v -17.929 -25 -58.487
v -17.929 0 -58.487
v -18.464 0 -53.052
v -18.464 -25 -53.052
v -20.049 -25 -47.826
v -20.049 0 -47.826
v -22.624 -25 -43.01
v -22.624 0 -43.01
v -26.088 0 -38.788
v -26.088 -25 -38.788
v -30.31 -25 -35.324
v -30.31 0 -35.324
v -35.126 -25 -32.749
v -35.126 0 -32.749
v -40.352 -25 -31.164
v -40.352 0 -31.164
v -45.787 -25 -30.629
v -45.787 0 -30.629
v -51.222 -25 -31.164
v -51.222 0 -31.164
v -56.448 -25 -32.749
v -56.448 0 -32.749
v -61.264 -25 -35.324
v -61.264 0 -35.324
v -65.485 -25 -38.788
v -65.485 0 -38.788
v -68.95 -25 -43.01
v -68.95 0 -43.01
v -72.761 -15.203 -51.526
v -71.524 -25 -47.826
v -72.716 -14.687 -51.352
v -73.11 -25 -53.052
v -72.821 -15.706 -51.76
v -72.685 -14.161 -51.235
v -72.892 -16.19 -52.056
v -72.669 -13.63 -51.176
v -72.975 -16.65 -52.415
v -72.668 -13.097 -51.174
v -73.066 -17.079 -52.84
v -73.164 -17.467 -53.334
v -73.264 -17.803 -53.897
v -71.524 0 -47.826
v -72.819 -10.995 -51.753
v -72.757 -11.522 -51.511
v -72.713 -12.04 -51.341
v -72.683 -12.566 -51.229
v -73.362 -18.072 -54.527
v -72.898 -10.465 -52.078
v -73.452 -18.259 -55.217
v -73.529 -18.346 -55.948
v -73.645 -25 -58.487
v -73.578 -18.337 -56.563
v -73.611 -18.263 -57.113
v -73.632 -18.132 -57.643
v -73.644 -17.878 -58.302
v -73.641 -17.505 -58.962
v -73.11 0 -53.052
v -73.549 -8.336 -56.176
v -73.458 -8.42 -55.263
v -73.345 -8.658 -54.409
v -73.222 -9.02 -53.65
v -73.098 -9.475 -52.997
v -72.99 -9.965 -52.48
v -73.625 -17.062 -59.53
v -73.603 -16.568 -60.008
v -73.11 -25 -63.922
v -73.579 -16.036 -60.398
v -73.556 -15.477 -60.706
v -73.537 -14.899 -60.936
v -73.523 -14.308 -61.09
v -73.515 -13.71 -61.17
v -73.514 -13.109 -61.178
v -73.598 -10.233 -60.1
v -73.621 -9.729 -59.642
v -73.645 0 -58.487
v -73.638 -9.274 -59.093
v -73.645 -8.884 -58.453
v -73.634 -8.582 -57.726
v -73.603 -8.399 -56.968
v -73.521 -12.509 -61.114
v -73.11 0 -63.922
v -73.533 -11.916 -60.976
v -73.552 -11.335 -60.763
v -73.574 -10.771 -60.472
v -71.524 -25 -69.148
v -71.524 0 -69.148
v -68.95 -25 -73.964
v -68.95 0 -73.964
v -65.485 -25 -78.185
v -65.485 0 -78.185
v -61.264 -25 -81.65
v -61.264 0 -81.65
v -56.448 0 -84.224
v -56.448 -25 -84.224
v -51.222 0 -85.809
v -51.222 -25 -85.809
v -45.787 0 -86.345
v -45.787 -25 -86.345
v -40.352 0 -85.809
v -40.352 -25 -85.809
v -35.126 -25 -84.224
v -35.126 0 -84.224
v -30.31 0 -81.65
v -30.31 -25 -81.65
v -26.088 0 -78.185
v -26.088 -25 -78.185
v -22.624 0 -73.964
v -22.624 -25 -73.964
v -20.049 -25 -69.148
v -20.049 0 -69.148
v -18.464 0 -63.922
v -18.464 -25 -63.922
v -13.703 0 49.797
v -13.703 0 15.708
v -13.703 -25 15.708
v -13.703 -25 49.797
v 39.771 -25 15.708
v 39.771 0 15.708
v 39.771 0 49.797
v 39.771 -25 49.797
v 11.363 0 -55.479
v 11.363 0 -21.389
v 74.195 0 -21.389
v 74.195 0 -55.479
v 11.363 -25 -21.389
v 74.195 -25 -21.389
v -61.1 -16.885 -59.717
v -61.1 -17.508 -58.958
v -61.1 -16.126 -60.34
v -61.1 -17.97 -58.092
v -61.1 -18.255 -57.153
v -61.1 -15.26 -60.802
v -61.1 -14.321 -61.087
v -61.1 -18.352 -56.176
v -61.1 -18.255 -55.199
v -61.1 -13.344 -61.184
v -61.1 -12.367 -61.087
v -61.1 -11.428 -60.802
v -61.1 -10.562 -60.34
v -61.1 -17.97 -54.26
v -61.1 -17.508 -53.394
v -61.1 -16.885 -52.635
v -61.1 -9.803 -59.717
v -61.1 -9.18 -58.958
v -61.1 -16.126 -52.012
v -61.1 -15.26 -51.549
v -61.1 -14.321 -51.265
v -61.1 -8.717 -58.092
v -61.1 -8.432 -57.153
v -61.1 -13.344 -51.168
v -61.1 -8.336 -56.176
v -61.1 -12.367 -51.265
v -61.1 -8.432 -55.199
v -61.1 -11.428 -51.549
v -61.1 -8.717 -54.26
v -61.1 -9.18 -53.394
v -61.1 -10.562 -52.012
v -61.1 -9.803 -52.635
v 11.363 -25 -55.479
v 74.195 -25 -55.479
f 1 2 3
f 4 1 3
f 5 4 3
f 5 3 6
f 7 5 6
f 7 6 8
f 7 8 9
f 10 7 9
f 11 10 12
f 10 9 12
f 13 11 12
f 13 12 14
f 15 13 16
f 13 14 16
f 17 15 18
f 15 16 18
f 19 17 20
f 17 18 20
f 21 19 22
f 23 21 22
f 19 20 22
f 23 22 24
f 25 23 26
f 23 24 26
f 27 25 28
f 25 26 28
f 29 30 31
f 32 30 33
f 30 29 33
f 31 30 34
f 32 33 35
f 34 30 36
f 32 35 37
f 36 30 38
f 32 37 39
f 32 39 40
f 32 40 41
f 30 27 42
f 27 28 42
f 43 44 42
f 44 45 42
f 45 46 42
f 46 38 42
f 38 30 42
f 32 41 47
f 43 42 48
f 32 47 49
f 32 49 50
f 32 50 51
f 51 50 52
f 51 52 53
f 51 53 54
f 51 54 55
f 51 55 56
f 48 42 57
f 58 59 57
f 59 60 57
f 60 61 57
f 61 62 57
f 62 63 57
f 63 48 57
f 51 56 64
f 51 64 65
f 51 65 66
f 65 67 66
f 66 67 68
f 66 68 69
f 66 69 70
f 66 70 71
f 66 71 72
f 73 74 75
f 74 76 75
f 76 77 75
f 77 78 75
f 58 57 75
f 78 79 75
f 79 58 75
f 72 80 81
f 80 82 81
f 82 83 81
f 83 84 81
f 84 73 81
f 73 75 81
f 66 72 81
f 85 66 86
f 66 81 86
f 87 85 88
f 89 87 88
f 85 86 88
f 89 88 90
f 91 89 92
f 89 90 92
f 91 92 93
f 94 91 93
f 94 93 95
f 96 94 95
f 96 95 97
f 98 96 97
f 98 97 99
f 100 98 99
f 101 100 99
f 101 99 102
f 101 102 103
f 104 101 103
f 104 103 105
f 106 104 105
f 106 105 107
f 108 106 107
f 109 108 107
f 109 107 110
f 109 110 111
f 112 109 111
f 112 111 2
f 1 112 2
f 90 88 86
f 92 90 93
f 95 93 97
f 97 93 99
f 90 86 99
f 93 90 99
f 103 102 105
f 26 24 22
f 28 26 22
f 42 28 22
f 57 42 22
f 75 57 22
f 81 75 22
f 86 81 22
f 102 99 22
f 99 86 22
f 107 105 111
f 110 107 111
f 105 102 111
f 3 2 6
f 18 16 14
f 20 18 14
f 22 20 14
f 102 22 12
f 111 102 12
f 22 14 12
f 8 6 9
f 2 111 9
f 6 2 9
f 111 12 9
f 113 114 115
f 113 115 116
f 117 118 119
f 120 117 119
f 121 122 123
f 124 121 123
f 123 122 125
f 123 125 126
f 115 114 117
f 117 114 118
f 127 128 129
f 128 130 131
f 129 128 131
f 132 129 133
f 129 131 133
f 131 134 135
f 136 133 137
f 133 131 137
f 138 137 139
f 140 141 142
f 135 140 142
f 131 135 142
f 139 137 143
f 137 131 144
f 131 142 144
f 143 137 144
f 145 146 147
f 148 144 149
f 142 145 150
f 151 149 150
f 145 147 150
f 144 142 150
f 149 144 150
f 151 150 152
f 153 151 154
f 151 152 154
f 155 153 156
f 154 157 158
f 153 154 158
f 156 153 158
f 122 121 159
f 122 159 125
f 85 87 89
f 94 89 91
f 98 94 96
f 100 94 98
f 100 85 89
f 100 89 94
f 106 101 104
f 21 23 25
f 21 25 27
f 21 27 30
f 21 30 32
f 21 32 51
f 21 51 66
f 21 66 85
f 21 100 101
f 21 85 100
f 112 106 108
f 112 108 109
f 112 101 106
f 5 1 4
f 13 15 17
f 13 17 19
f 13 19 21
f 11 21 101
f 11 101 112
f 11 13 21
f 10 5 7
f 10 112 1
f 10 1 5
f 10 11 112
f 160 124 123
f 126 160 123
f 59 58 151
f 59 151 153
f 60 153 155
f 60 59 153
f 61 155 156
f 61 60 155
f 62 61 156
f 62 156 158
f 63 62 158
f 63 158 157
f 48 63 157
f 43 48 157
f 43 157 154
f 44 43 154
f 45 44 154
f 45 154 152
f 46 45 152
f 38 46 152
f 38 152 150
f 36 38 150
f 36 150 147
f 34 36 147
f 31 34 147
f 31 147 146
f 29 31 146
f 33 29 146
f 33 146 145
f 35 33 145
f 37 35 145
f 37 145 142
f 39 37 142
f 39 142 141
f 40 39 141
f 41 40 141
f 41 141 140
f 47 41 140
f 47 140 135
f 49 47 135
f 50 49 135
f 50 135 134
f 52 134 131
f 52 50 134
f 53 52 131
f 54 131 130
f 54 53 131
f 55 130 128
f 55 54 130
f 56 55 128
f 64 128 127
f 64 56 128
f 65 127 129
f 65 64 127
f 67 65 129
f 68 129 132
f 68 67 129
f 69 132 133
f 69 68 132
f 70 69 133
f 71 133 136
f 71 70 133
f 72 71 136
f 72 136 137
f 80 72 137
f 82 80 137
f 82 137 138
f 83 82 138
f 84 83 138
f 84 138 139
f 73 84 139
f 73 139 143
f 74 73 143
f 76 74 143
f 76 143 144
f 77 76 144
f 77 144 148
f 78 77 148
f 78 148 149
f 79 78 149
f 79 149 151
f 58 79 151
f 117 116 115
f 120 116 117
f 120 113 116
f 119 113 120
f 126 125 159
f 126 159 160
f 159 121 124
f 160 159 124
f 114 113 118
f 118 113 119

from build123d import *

# Parameters (mm, degrees)
F0_W     = 55.8131188154
F0_H     = 58.4868006408
F1_DEPTH = 25
F0_W_2   = 62.8315312788
F0_H_2   = 34.0894516557
F0_W_3   = 53.4736467525
F2_R     = 19.539154605
F3_DEPTH = 25
F2_R_2   = 27.8579849408
F6_R     = 5.0076526177
F7_DEPTH = 39.3


with BuildPart() as f1:
    # F0 (on Front) → F1 (new body)
    with BuildSketch(Plane.XZ):
        with Locations((-83.7196856737, 10.5276275426)):
            Rectangle(F0_W, F0_H)
    extrude(amount=F1_DEPTH)


with BuildPart() as f1b:
    # F0 (on Front) → F1, piece 2 (new body)
    with BuildSketch(Plane.XZ):
        with Locations((42.7789115347, -38.4341822937)):
            Rectangle(F0_W_2, F0_H_2)
    extrude(amount=F1_DEPTH)


with BuildPart() as f1c:
    # F0 (on Front) → F1, piece 3 (new body)
    with BuildSketch(Plane.XZ):
        with Locations((13.0341933109, 32.7526116744)):
            Rectangle(F0_W_3, F0_H_2)
    extrude(amount=F1_DEPTH)


with BuildPart() as f3:
    # F2 (on Front) → F3 (new body)
    with BuildSketch(Plane.XZ):
        with Locations((109.2867553234, 38.7683957815)):
            Circle(F2_R)
    extrude(amount=F3_DEPTH)


with BuildPart() as f3b:
    # F2 (on Front) → F3, piece 2 (new body)
    with BuildSketch(Plane.XZ):
        with Locations((-45.7868166268, -58.4867969155)):
            Circle(F2_R_2)
    extrude(amount=F3_DEPTH)

    # F6 (on offset) → F7 (cut)
    with BuildSketch(Plane.YZ.offset(-100.4)):
        with Locations((-13.3439255878, -56.1759546399)):
            Circle(F6_R)
    extrude(amount=F7_DEPTH, mode=Mode.SUBTRACT)


solid = Compound([f1b.part, f1c.part, f3b.part])
